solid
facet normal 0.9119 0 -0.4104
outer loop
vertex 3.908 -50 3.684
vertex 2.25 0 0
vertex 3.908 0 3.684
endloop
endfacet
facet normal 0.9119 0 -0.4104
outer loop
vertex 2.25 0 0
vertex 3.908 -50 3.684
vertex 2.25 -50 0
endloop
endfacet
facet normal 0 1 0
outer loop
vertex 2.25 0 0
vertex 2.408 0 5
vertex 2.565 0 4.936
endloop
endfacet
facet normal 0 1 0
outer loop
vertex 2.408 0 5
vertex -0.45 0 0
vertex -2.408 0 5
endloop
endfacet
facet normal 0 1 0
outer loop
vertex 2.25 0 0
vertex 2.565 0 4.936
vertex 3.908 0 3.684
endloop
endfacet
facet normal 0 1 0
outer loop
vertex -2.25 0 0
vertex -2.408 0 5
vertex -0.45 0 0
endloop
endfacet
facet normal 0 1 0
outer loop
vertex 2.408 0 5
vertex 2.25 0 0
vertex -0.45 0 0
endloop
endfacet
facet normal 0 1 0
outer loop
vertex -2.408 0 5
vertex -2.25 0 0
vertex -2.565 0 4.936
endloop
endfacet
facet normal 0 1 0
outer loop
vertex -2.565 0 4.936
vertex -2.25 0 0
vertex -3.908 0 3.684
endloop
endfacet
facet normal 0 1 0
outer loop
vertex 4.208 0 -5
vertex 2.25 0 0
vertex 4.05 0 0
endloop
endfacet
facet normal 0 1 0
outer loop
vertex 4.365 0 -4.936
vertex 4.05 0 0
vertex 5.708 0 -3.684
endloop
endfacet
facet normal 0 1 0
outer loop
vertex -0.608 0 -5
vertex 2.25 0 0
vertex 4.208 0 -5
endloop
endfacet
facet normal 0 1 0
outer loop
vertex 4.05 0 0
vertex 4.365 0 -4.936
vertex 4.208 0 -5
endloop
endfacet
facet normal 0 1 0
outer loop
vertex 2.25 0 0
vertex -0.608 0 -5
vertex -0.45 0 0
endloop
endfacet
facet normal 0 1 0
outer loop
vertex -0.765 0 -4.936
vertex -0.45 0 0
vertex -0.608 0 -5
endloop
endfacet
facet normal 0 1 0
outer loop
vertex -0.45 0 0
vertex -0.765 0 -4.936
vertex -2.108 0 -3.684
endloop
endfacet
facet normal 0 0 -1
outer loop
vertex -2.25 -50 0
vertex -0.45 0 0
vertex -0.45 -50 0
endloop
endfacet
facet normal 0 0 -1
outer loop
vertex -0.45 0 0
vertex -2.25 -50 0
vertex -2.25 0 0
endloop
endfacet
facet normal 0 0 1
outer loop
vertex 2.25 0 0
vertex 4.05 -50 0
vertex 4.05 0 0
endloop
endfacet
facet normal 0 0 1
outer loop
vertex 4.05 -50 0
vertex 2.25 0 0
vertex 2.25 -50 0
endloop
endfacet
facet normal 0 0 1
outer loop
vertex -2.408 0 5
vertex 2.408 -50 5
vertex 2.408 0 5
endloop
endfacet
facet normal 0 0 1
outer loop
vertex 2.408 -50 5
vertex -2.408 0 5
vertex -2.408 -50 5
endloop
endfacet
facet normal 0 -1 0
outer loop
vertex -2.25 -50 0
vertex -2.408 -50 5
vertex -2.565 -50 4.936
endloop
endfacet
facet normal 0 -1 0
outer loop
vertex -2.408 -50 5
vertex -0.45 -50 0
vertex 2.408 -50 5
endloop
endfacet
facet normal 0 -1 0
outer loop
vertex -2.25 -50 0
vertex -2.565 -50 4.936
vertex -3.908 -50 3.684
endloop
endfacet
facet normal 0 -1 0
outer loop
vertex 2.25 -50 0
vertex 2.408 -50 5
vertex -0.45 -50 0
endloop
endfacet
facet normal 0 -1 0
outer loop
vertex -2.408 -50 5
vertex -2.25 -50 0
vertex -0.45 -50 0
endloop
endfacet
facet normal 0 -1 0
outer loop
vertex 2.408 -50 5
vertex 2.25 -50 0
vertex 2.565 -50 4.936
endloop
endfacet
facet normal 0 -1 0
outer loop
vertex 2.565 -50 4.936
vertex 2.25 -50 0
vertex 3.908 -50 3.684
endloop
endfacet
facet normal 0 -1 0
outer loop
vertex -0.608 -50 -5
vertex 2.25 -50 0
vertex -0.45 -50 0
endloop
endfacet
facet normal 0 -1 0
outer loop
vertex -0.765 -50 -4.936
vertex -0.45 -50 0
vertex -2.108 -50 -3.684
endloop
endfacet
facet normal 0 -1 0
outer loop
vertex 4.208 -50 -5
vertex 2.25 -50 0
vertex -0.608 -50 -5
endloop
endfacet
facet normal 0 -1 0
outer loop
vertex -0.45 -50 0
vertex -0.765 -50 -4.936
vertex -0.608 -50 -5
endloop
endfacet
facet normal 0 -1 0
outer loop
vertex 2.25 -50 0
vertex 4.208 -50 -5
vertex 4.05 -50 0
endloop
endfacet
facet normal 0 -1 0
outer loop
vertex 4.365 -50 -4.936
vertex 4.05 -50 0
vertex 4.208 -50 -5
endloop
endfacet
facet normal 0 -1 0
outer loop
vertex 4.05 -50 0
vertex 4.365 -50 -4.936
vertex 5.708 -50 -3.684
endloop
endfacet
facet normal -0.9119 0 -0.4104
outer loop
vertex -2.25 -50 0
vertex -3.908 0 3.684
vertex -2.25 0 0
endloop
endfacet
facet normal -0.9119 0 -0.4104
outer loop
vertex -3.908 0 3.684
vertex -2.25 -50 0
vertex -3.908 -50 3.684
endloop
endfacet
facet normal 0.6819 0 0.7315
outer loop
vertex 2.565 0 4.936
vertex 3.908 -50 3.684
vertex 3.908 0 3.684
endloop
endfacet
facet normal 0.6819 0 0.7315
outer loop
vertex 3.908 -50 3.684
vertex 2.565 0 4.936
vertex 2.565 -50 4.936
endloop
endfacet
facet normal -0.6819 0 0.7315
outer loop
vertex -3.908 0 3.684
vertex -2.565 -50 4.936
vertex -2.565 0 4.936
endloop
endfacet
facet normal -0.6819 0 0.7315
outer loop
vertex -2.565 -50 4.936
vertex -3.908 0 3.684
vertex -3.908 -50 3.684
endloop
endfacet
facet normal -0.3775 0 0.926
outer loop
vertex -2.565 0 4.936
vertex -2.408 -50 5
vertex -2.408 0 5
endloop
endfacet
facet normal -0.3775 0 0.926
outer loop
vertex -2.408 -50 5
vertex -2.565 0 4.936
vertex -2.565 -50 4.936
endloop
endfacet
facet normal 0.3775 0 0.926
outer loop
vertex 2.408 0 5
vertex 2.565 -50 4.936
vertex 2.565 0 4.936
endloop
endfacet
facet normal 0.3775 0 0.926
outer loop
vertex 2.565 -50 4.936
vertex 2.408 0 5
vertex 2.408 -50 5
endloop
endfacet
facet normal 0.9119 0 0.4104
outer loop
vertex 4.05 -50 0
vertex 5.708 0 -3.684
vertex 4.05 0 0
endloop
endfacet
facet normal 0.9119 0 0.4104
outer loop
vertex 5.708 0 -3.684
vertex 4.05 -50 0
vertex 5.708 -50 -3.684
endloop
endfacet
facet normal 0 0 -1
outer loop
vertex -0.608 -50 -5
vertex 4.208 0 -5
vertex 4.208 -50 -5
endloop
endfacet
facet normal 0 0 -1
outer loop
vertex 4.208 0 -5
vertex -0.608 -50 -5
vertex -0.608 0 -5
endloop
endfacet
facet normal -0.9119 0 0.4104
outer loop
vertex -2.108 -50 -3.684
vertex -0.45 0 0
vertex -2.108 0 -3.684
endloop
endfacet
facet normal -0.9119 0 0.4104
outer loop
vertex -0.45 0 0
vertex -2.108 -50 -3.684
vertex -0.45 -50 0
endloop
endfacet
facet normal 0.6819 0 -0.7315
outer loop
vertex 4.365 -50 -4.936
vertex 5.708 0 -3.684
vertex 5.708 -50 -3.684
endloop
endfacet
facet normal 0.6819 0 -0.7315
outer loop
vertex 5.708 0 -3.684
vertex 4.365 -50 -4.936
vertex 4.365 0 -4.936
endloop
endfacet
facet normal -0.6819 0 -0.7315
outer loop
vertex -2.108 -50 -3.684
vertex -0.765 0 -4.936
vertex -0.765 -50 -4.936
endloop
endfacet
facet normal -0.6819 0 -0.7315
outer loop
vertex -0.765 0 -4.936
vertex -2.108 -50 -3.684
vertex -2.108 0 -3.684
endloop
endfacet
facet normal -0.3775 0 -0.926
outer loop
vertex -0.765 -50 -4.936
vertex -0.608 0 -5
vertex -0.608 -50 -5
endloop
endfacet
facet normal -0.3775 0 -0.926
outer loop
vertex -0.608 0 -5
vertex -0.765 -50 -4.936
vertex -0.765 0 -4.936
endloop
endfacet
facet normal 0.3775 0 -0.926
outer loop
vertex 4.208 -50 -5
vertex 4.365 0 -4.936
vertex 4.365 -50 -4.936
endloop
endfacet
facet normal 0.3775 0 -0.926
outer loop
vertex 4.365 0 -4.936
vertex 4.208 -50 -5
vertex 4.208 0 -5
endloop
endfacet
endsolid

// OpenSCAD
// file: globals.scad
/*
Most things in this file is represented as one millimeter, so keep that in mind while changing things.
Some of the setting are not mm but at variables that you can set, such as 2*x=2x and you are setting what x is.
I will try to specify when things are variables and not exact measurements.
*/

obj_leg = 30;
leg_length = 5.5;
small_number = 0.001;
metal_core_rode_global = 5;


///////////////// number of holes /////////////////////
z_hole_number = 8;
other_holes = 8;

///////////////// Pins /////////////////////

//pins that poke out
ball_size = 10;
pin_height = 20;
pin_diameter = 6;


//holes
hole_ball_size = ball_size;
hole_pin_height = pin_height;
hole_pin_diameter = pin_diameter;

///////////////// Z THINGS /////////////////////

berring_slot_width = 7.5;
berring_slot_depth = 6.5;
metal_core_rode = 5;

///////////////// X THINGS /////////////////////

//male dove tails
max_width=10;
min_width=5;
depth=5;
height=obj_leg/2;

//female dove tails, this is found on the y mounts
girl_max_width=11;
girl_min_width=5;
girl_depth=5;
girl_height=obj_leg;


///////////////// Y THINGS /////////////////////
/*
The Y is so normal that all of those global variables at the top should change all of the setting in it, this section is set her incase there are variables set in the future development of this project.
*/
// file: include.scad
//////////////////      END SECTION       //////////////////

	module added_pins(){
		difference(){
			union(){
				translate([30/(15/4),obj_leg*leg_length,30/(15/4)]) pin();
				translate([30/(15/4)+14.5,obj_leg*leg_length,30/(15/4)+14]) pin();
			}
			union(){
							translate([30/(15/4)+13.5,obj_leg*leg_length-20,30/(15/4)+5])cube(size=[2,40,15]);
							translate([30/(15/4)+7.5,obj_leg*leg_length-20,30/(15/4)+15])rotate([0,90,0]) cube(size=[2,40,15]);	

							translate([30/(15/4)-1,obj_leg*leg_length-20,30/(15/4)-8])cube(size=[2,40,15]);
							translate([30/(15/4)-10,obj_leg*leg_length-20,30/(15/4)+1])rotate([0,90,0]) cube(size=[2,40,15]);
			}
		}
	}
	module taken_pins() {
		translate([30/(15/4)+14,obj_leg*leg_length-10,30/(15/4)]) mirror_pin();
		translate([30/(15/4),obj_leg*leg_length-10,30/(15/4)+15]) mirror_pin();
	}


//////////////////      OTHER STUFF       //////////////////

	module holes() {
		rotate([0,0,90]) for(y=[0:other_holes])
		translate([obj_leg+y*15,-15.5,7.5]) union() {
			translate([7.5,0,15]) hole_up();
			hole_down();
		}
	}
	module extend_holes() {
	module top(){
		rotate([0,0,90]) for(y=[0:other_holes+1])
		translate([(30/4)+y*15,-15.5,7.5]) union() {
			translate([7.5,0,15]) hole_up();
		}
	}
	module bottom(){
		rotate([0,0,90]) for(y=[0:other_holes+2])
		translate([(30/4)+y*15,-15.5,7.5]) union() {
			hole_down();
		
}
	}
	union(){
		top();
		bottom();
	}
	}

	module hole() {
		union() {
			rotate([90, 90, 0]) cylinder(h=40, d=hole_pin_diameter, center=true);
			translate([0,7.5,0]) sphere(d=hole_ball_size);
			translate([0,-6,0]) sphere(d=hole_ball_size);
		}
	}
	module hole_up() {
		union() {
			rotate([90, 90, 0]) cylinder(h=40, d=hole_pin_diameter, center=true);
			translate([0,7.5,10]) cylinder(h=hole_pin_height, d=hole_pin_diameter, center=true);
			translate([0,-6,10]) cylinder(h=hole_pin_height, d=hole_pin_diameter, center=true);
			translate([0,7.5,0]) sphere(d=hole_ball_size);
			translate([0,-6,0]) sphere(d=hole_ball_size);
		}
	}
	module hole_down() {
		union() {
			rotate([90, 90, 0]) cylinder(h=40, d=hole_pin_diameter, center=true);
			translate([0,7.5,-10]) cylinder(h=hole_pin_height, d=hole_pin_diameter, center=true);
			translate([0,-6,-10]) cylinder(h=hole_pin_height, d=hole_pin_diameter, center=true);
			translate([0,7.5,0]) sphere(d=hole_ball_size);
			translate([0,-6,0]) sphere(d=hole_ball_size);
		}
	}
	module pin() {
		union() {
			rotate([90, 90, 0]) cylinder(h=pin_height, d=pin_diameter, center=true);
			translate([0,7.5,0]) sphere(d=ball_size);
		}
	}

	module mirror_pin() {
		rotate([90, 90, 0]) cylinder(h=hole_pin_height+small_number, d=hole_pin_diameter, center=true);
		translate([0,-(pin_height-(ball_size/2)),0]) sphere(d=ball_size);
	}


//////////////////      SOME RACK AND Z THINGS       //////////////////

module z_holes() {
    rotate([0,-90,0]) for(z=[0:z_hole_number])
    translate([22.5+z*15,16,-12])
        hole();
}

module pin_cuts() {
	union(){
		cube(size=[2,10,40], center=true);
		rotate([0,0,90]) cube(size=[2,10,40], center=true);
	}
}
module pin_uncut() {
	union(){
		rotate([0, 0, 90]) cylinder(h=hole_pin_height, d=hole_pin_diameter, center=true);
		translate([0,0,10]) sphere(d=ball_hole);
	}
}


module pin_out() {
	union(){
		rotate([0, 0, 90]) cylinder(h=pin_height, d=pin_diameter, center=true);
		translate([0,0,10]) sphere(d= ball_size);
	}
}


module pins_z(){
	difference() {
		pin_out();
		pin_cuts();
	}
}
//////////////////      RACK AND SLIDE     ///////////////////

module straight_pins() {
	for(z=[0:((((obj_leg*leg_length)*2)-(obj_leg*2))/3)/14.5]) rotate([-90,0,0]) translate([z*15,30/(15/4),14]) pins_z();
	for(z=[0:((((obj_leg*leg_length)*2)-(obj_leg*2))/3)/14.5]) rotate([-90,0,0]) translate([z*15,30/(15/4)-14,14]) pins_z();
}
module stagger_pins() {
	for(z=[0:((((obj_leg*leg_length)*2)-(obj_leg*2))/3)/14.5]) rotate([-90,0,0]) translate([z*15,30/(15/4),14]) pins_z();
	for(z=[0:((((obj_leg*leg_length)*2)-(obj_leg*2))/3)/14.5]) rotate([-90,0,0]) translate([z*15+7,30/(15/4)-14,14]) pins_z();
}


//////////////////      DOVE TAIL       //////////////////

module male_dovetail(height) {
	dovetail_3d(max_width,min_width,depth,height);
}

module dovetail_3d(max_width=11, min_width=5, depth=5, height=30) {
	linear_extrude(height=height, convexity=2)
		dovetail_2d(max_width,min_width,depth);
}

module dovetail_2d(max_width=11, min_width=5, depth=5) {
	angle=atan((max_width/2-min_width/2)/depth);
	echo("angle: ", angle);
	polygon(paths=[[0,1,2,3,0]], points=[[-min_width/2,0], [-max_width/2,depth], [max_width/2, depth], [min_width/2,0]]);
}

//bow tie
	module tie_end(height){
				rotate([0,0,0]) translate([0,-0.01,((obj_leg/2)/2)]) male_dovetail(height);
				rotate([0,90,0]) translate([0,-0.01,((obj_leg/2)/2)]) male_dovetail(height);
				rotate([0,180,0]) translate([0,-0.01,((obj_leg/2)/2)]) male_dovetail(height);
				rotate([0,-90,0]) translate([0,-0.01,((obj_leg/2)/2)]) male_dovetail(height);
	}

module bow_support(){
	difference(){
		intersection(){
			translate([-15,0,-15]) cube([30,9,30]);
			scale([1.05,1.05,1.05]) rotate([0,45,0]) tie_end();
		}
		cube([29.2,29.2,29.2], center=true);
	}
}

	module wrap(){
		depth = 30;
				translate([-15,30,15]) rotate([90,180,90]) male_dovetail(height=depth);
				rotate([0,90,0]) translate([-15,30,15]) rotate([90,180,90]) male_dovetail(height=depth);
				rotate([0,180,0]) translate([-15,30,15]) rotate([90,180,90]) male_dovetail(height=depth);
				rotate([0,-90,0]) translate([-15,30,15]) rotate([90,180,90]) male_dovetail(height=depth);
	}
// main file
length = 50;
tilt_level = 1.1;
scaling_x = .9;
scaling_y = 1;
scaling_z = 1;
include <include.scad>;
include <globals.scad>;

obj_leg= 12;

// unaligend version of bow tie. Why? I printed twist corners that do not match the extention parts, so this is the fix :3

module bow_tie_rounded() {
    intersection () {
        male_dovetail(height=length);
        cylinder(r=5.7, h=200);
    }
}

module bow_tie_master(){
	union(){
        translate([2,0,0]) mirror([0,1,0]){
            bow_tie_rounded();
        }
        bow_tie_rounded();
	}
}

// do the part
scale([scaling_x,scaling_y,scaling_z]) rotate([90,0,0]) bow_tie_master();
